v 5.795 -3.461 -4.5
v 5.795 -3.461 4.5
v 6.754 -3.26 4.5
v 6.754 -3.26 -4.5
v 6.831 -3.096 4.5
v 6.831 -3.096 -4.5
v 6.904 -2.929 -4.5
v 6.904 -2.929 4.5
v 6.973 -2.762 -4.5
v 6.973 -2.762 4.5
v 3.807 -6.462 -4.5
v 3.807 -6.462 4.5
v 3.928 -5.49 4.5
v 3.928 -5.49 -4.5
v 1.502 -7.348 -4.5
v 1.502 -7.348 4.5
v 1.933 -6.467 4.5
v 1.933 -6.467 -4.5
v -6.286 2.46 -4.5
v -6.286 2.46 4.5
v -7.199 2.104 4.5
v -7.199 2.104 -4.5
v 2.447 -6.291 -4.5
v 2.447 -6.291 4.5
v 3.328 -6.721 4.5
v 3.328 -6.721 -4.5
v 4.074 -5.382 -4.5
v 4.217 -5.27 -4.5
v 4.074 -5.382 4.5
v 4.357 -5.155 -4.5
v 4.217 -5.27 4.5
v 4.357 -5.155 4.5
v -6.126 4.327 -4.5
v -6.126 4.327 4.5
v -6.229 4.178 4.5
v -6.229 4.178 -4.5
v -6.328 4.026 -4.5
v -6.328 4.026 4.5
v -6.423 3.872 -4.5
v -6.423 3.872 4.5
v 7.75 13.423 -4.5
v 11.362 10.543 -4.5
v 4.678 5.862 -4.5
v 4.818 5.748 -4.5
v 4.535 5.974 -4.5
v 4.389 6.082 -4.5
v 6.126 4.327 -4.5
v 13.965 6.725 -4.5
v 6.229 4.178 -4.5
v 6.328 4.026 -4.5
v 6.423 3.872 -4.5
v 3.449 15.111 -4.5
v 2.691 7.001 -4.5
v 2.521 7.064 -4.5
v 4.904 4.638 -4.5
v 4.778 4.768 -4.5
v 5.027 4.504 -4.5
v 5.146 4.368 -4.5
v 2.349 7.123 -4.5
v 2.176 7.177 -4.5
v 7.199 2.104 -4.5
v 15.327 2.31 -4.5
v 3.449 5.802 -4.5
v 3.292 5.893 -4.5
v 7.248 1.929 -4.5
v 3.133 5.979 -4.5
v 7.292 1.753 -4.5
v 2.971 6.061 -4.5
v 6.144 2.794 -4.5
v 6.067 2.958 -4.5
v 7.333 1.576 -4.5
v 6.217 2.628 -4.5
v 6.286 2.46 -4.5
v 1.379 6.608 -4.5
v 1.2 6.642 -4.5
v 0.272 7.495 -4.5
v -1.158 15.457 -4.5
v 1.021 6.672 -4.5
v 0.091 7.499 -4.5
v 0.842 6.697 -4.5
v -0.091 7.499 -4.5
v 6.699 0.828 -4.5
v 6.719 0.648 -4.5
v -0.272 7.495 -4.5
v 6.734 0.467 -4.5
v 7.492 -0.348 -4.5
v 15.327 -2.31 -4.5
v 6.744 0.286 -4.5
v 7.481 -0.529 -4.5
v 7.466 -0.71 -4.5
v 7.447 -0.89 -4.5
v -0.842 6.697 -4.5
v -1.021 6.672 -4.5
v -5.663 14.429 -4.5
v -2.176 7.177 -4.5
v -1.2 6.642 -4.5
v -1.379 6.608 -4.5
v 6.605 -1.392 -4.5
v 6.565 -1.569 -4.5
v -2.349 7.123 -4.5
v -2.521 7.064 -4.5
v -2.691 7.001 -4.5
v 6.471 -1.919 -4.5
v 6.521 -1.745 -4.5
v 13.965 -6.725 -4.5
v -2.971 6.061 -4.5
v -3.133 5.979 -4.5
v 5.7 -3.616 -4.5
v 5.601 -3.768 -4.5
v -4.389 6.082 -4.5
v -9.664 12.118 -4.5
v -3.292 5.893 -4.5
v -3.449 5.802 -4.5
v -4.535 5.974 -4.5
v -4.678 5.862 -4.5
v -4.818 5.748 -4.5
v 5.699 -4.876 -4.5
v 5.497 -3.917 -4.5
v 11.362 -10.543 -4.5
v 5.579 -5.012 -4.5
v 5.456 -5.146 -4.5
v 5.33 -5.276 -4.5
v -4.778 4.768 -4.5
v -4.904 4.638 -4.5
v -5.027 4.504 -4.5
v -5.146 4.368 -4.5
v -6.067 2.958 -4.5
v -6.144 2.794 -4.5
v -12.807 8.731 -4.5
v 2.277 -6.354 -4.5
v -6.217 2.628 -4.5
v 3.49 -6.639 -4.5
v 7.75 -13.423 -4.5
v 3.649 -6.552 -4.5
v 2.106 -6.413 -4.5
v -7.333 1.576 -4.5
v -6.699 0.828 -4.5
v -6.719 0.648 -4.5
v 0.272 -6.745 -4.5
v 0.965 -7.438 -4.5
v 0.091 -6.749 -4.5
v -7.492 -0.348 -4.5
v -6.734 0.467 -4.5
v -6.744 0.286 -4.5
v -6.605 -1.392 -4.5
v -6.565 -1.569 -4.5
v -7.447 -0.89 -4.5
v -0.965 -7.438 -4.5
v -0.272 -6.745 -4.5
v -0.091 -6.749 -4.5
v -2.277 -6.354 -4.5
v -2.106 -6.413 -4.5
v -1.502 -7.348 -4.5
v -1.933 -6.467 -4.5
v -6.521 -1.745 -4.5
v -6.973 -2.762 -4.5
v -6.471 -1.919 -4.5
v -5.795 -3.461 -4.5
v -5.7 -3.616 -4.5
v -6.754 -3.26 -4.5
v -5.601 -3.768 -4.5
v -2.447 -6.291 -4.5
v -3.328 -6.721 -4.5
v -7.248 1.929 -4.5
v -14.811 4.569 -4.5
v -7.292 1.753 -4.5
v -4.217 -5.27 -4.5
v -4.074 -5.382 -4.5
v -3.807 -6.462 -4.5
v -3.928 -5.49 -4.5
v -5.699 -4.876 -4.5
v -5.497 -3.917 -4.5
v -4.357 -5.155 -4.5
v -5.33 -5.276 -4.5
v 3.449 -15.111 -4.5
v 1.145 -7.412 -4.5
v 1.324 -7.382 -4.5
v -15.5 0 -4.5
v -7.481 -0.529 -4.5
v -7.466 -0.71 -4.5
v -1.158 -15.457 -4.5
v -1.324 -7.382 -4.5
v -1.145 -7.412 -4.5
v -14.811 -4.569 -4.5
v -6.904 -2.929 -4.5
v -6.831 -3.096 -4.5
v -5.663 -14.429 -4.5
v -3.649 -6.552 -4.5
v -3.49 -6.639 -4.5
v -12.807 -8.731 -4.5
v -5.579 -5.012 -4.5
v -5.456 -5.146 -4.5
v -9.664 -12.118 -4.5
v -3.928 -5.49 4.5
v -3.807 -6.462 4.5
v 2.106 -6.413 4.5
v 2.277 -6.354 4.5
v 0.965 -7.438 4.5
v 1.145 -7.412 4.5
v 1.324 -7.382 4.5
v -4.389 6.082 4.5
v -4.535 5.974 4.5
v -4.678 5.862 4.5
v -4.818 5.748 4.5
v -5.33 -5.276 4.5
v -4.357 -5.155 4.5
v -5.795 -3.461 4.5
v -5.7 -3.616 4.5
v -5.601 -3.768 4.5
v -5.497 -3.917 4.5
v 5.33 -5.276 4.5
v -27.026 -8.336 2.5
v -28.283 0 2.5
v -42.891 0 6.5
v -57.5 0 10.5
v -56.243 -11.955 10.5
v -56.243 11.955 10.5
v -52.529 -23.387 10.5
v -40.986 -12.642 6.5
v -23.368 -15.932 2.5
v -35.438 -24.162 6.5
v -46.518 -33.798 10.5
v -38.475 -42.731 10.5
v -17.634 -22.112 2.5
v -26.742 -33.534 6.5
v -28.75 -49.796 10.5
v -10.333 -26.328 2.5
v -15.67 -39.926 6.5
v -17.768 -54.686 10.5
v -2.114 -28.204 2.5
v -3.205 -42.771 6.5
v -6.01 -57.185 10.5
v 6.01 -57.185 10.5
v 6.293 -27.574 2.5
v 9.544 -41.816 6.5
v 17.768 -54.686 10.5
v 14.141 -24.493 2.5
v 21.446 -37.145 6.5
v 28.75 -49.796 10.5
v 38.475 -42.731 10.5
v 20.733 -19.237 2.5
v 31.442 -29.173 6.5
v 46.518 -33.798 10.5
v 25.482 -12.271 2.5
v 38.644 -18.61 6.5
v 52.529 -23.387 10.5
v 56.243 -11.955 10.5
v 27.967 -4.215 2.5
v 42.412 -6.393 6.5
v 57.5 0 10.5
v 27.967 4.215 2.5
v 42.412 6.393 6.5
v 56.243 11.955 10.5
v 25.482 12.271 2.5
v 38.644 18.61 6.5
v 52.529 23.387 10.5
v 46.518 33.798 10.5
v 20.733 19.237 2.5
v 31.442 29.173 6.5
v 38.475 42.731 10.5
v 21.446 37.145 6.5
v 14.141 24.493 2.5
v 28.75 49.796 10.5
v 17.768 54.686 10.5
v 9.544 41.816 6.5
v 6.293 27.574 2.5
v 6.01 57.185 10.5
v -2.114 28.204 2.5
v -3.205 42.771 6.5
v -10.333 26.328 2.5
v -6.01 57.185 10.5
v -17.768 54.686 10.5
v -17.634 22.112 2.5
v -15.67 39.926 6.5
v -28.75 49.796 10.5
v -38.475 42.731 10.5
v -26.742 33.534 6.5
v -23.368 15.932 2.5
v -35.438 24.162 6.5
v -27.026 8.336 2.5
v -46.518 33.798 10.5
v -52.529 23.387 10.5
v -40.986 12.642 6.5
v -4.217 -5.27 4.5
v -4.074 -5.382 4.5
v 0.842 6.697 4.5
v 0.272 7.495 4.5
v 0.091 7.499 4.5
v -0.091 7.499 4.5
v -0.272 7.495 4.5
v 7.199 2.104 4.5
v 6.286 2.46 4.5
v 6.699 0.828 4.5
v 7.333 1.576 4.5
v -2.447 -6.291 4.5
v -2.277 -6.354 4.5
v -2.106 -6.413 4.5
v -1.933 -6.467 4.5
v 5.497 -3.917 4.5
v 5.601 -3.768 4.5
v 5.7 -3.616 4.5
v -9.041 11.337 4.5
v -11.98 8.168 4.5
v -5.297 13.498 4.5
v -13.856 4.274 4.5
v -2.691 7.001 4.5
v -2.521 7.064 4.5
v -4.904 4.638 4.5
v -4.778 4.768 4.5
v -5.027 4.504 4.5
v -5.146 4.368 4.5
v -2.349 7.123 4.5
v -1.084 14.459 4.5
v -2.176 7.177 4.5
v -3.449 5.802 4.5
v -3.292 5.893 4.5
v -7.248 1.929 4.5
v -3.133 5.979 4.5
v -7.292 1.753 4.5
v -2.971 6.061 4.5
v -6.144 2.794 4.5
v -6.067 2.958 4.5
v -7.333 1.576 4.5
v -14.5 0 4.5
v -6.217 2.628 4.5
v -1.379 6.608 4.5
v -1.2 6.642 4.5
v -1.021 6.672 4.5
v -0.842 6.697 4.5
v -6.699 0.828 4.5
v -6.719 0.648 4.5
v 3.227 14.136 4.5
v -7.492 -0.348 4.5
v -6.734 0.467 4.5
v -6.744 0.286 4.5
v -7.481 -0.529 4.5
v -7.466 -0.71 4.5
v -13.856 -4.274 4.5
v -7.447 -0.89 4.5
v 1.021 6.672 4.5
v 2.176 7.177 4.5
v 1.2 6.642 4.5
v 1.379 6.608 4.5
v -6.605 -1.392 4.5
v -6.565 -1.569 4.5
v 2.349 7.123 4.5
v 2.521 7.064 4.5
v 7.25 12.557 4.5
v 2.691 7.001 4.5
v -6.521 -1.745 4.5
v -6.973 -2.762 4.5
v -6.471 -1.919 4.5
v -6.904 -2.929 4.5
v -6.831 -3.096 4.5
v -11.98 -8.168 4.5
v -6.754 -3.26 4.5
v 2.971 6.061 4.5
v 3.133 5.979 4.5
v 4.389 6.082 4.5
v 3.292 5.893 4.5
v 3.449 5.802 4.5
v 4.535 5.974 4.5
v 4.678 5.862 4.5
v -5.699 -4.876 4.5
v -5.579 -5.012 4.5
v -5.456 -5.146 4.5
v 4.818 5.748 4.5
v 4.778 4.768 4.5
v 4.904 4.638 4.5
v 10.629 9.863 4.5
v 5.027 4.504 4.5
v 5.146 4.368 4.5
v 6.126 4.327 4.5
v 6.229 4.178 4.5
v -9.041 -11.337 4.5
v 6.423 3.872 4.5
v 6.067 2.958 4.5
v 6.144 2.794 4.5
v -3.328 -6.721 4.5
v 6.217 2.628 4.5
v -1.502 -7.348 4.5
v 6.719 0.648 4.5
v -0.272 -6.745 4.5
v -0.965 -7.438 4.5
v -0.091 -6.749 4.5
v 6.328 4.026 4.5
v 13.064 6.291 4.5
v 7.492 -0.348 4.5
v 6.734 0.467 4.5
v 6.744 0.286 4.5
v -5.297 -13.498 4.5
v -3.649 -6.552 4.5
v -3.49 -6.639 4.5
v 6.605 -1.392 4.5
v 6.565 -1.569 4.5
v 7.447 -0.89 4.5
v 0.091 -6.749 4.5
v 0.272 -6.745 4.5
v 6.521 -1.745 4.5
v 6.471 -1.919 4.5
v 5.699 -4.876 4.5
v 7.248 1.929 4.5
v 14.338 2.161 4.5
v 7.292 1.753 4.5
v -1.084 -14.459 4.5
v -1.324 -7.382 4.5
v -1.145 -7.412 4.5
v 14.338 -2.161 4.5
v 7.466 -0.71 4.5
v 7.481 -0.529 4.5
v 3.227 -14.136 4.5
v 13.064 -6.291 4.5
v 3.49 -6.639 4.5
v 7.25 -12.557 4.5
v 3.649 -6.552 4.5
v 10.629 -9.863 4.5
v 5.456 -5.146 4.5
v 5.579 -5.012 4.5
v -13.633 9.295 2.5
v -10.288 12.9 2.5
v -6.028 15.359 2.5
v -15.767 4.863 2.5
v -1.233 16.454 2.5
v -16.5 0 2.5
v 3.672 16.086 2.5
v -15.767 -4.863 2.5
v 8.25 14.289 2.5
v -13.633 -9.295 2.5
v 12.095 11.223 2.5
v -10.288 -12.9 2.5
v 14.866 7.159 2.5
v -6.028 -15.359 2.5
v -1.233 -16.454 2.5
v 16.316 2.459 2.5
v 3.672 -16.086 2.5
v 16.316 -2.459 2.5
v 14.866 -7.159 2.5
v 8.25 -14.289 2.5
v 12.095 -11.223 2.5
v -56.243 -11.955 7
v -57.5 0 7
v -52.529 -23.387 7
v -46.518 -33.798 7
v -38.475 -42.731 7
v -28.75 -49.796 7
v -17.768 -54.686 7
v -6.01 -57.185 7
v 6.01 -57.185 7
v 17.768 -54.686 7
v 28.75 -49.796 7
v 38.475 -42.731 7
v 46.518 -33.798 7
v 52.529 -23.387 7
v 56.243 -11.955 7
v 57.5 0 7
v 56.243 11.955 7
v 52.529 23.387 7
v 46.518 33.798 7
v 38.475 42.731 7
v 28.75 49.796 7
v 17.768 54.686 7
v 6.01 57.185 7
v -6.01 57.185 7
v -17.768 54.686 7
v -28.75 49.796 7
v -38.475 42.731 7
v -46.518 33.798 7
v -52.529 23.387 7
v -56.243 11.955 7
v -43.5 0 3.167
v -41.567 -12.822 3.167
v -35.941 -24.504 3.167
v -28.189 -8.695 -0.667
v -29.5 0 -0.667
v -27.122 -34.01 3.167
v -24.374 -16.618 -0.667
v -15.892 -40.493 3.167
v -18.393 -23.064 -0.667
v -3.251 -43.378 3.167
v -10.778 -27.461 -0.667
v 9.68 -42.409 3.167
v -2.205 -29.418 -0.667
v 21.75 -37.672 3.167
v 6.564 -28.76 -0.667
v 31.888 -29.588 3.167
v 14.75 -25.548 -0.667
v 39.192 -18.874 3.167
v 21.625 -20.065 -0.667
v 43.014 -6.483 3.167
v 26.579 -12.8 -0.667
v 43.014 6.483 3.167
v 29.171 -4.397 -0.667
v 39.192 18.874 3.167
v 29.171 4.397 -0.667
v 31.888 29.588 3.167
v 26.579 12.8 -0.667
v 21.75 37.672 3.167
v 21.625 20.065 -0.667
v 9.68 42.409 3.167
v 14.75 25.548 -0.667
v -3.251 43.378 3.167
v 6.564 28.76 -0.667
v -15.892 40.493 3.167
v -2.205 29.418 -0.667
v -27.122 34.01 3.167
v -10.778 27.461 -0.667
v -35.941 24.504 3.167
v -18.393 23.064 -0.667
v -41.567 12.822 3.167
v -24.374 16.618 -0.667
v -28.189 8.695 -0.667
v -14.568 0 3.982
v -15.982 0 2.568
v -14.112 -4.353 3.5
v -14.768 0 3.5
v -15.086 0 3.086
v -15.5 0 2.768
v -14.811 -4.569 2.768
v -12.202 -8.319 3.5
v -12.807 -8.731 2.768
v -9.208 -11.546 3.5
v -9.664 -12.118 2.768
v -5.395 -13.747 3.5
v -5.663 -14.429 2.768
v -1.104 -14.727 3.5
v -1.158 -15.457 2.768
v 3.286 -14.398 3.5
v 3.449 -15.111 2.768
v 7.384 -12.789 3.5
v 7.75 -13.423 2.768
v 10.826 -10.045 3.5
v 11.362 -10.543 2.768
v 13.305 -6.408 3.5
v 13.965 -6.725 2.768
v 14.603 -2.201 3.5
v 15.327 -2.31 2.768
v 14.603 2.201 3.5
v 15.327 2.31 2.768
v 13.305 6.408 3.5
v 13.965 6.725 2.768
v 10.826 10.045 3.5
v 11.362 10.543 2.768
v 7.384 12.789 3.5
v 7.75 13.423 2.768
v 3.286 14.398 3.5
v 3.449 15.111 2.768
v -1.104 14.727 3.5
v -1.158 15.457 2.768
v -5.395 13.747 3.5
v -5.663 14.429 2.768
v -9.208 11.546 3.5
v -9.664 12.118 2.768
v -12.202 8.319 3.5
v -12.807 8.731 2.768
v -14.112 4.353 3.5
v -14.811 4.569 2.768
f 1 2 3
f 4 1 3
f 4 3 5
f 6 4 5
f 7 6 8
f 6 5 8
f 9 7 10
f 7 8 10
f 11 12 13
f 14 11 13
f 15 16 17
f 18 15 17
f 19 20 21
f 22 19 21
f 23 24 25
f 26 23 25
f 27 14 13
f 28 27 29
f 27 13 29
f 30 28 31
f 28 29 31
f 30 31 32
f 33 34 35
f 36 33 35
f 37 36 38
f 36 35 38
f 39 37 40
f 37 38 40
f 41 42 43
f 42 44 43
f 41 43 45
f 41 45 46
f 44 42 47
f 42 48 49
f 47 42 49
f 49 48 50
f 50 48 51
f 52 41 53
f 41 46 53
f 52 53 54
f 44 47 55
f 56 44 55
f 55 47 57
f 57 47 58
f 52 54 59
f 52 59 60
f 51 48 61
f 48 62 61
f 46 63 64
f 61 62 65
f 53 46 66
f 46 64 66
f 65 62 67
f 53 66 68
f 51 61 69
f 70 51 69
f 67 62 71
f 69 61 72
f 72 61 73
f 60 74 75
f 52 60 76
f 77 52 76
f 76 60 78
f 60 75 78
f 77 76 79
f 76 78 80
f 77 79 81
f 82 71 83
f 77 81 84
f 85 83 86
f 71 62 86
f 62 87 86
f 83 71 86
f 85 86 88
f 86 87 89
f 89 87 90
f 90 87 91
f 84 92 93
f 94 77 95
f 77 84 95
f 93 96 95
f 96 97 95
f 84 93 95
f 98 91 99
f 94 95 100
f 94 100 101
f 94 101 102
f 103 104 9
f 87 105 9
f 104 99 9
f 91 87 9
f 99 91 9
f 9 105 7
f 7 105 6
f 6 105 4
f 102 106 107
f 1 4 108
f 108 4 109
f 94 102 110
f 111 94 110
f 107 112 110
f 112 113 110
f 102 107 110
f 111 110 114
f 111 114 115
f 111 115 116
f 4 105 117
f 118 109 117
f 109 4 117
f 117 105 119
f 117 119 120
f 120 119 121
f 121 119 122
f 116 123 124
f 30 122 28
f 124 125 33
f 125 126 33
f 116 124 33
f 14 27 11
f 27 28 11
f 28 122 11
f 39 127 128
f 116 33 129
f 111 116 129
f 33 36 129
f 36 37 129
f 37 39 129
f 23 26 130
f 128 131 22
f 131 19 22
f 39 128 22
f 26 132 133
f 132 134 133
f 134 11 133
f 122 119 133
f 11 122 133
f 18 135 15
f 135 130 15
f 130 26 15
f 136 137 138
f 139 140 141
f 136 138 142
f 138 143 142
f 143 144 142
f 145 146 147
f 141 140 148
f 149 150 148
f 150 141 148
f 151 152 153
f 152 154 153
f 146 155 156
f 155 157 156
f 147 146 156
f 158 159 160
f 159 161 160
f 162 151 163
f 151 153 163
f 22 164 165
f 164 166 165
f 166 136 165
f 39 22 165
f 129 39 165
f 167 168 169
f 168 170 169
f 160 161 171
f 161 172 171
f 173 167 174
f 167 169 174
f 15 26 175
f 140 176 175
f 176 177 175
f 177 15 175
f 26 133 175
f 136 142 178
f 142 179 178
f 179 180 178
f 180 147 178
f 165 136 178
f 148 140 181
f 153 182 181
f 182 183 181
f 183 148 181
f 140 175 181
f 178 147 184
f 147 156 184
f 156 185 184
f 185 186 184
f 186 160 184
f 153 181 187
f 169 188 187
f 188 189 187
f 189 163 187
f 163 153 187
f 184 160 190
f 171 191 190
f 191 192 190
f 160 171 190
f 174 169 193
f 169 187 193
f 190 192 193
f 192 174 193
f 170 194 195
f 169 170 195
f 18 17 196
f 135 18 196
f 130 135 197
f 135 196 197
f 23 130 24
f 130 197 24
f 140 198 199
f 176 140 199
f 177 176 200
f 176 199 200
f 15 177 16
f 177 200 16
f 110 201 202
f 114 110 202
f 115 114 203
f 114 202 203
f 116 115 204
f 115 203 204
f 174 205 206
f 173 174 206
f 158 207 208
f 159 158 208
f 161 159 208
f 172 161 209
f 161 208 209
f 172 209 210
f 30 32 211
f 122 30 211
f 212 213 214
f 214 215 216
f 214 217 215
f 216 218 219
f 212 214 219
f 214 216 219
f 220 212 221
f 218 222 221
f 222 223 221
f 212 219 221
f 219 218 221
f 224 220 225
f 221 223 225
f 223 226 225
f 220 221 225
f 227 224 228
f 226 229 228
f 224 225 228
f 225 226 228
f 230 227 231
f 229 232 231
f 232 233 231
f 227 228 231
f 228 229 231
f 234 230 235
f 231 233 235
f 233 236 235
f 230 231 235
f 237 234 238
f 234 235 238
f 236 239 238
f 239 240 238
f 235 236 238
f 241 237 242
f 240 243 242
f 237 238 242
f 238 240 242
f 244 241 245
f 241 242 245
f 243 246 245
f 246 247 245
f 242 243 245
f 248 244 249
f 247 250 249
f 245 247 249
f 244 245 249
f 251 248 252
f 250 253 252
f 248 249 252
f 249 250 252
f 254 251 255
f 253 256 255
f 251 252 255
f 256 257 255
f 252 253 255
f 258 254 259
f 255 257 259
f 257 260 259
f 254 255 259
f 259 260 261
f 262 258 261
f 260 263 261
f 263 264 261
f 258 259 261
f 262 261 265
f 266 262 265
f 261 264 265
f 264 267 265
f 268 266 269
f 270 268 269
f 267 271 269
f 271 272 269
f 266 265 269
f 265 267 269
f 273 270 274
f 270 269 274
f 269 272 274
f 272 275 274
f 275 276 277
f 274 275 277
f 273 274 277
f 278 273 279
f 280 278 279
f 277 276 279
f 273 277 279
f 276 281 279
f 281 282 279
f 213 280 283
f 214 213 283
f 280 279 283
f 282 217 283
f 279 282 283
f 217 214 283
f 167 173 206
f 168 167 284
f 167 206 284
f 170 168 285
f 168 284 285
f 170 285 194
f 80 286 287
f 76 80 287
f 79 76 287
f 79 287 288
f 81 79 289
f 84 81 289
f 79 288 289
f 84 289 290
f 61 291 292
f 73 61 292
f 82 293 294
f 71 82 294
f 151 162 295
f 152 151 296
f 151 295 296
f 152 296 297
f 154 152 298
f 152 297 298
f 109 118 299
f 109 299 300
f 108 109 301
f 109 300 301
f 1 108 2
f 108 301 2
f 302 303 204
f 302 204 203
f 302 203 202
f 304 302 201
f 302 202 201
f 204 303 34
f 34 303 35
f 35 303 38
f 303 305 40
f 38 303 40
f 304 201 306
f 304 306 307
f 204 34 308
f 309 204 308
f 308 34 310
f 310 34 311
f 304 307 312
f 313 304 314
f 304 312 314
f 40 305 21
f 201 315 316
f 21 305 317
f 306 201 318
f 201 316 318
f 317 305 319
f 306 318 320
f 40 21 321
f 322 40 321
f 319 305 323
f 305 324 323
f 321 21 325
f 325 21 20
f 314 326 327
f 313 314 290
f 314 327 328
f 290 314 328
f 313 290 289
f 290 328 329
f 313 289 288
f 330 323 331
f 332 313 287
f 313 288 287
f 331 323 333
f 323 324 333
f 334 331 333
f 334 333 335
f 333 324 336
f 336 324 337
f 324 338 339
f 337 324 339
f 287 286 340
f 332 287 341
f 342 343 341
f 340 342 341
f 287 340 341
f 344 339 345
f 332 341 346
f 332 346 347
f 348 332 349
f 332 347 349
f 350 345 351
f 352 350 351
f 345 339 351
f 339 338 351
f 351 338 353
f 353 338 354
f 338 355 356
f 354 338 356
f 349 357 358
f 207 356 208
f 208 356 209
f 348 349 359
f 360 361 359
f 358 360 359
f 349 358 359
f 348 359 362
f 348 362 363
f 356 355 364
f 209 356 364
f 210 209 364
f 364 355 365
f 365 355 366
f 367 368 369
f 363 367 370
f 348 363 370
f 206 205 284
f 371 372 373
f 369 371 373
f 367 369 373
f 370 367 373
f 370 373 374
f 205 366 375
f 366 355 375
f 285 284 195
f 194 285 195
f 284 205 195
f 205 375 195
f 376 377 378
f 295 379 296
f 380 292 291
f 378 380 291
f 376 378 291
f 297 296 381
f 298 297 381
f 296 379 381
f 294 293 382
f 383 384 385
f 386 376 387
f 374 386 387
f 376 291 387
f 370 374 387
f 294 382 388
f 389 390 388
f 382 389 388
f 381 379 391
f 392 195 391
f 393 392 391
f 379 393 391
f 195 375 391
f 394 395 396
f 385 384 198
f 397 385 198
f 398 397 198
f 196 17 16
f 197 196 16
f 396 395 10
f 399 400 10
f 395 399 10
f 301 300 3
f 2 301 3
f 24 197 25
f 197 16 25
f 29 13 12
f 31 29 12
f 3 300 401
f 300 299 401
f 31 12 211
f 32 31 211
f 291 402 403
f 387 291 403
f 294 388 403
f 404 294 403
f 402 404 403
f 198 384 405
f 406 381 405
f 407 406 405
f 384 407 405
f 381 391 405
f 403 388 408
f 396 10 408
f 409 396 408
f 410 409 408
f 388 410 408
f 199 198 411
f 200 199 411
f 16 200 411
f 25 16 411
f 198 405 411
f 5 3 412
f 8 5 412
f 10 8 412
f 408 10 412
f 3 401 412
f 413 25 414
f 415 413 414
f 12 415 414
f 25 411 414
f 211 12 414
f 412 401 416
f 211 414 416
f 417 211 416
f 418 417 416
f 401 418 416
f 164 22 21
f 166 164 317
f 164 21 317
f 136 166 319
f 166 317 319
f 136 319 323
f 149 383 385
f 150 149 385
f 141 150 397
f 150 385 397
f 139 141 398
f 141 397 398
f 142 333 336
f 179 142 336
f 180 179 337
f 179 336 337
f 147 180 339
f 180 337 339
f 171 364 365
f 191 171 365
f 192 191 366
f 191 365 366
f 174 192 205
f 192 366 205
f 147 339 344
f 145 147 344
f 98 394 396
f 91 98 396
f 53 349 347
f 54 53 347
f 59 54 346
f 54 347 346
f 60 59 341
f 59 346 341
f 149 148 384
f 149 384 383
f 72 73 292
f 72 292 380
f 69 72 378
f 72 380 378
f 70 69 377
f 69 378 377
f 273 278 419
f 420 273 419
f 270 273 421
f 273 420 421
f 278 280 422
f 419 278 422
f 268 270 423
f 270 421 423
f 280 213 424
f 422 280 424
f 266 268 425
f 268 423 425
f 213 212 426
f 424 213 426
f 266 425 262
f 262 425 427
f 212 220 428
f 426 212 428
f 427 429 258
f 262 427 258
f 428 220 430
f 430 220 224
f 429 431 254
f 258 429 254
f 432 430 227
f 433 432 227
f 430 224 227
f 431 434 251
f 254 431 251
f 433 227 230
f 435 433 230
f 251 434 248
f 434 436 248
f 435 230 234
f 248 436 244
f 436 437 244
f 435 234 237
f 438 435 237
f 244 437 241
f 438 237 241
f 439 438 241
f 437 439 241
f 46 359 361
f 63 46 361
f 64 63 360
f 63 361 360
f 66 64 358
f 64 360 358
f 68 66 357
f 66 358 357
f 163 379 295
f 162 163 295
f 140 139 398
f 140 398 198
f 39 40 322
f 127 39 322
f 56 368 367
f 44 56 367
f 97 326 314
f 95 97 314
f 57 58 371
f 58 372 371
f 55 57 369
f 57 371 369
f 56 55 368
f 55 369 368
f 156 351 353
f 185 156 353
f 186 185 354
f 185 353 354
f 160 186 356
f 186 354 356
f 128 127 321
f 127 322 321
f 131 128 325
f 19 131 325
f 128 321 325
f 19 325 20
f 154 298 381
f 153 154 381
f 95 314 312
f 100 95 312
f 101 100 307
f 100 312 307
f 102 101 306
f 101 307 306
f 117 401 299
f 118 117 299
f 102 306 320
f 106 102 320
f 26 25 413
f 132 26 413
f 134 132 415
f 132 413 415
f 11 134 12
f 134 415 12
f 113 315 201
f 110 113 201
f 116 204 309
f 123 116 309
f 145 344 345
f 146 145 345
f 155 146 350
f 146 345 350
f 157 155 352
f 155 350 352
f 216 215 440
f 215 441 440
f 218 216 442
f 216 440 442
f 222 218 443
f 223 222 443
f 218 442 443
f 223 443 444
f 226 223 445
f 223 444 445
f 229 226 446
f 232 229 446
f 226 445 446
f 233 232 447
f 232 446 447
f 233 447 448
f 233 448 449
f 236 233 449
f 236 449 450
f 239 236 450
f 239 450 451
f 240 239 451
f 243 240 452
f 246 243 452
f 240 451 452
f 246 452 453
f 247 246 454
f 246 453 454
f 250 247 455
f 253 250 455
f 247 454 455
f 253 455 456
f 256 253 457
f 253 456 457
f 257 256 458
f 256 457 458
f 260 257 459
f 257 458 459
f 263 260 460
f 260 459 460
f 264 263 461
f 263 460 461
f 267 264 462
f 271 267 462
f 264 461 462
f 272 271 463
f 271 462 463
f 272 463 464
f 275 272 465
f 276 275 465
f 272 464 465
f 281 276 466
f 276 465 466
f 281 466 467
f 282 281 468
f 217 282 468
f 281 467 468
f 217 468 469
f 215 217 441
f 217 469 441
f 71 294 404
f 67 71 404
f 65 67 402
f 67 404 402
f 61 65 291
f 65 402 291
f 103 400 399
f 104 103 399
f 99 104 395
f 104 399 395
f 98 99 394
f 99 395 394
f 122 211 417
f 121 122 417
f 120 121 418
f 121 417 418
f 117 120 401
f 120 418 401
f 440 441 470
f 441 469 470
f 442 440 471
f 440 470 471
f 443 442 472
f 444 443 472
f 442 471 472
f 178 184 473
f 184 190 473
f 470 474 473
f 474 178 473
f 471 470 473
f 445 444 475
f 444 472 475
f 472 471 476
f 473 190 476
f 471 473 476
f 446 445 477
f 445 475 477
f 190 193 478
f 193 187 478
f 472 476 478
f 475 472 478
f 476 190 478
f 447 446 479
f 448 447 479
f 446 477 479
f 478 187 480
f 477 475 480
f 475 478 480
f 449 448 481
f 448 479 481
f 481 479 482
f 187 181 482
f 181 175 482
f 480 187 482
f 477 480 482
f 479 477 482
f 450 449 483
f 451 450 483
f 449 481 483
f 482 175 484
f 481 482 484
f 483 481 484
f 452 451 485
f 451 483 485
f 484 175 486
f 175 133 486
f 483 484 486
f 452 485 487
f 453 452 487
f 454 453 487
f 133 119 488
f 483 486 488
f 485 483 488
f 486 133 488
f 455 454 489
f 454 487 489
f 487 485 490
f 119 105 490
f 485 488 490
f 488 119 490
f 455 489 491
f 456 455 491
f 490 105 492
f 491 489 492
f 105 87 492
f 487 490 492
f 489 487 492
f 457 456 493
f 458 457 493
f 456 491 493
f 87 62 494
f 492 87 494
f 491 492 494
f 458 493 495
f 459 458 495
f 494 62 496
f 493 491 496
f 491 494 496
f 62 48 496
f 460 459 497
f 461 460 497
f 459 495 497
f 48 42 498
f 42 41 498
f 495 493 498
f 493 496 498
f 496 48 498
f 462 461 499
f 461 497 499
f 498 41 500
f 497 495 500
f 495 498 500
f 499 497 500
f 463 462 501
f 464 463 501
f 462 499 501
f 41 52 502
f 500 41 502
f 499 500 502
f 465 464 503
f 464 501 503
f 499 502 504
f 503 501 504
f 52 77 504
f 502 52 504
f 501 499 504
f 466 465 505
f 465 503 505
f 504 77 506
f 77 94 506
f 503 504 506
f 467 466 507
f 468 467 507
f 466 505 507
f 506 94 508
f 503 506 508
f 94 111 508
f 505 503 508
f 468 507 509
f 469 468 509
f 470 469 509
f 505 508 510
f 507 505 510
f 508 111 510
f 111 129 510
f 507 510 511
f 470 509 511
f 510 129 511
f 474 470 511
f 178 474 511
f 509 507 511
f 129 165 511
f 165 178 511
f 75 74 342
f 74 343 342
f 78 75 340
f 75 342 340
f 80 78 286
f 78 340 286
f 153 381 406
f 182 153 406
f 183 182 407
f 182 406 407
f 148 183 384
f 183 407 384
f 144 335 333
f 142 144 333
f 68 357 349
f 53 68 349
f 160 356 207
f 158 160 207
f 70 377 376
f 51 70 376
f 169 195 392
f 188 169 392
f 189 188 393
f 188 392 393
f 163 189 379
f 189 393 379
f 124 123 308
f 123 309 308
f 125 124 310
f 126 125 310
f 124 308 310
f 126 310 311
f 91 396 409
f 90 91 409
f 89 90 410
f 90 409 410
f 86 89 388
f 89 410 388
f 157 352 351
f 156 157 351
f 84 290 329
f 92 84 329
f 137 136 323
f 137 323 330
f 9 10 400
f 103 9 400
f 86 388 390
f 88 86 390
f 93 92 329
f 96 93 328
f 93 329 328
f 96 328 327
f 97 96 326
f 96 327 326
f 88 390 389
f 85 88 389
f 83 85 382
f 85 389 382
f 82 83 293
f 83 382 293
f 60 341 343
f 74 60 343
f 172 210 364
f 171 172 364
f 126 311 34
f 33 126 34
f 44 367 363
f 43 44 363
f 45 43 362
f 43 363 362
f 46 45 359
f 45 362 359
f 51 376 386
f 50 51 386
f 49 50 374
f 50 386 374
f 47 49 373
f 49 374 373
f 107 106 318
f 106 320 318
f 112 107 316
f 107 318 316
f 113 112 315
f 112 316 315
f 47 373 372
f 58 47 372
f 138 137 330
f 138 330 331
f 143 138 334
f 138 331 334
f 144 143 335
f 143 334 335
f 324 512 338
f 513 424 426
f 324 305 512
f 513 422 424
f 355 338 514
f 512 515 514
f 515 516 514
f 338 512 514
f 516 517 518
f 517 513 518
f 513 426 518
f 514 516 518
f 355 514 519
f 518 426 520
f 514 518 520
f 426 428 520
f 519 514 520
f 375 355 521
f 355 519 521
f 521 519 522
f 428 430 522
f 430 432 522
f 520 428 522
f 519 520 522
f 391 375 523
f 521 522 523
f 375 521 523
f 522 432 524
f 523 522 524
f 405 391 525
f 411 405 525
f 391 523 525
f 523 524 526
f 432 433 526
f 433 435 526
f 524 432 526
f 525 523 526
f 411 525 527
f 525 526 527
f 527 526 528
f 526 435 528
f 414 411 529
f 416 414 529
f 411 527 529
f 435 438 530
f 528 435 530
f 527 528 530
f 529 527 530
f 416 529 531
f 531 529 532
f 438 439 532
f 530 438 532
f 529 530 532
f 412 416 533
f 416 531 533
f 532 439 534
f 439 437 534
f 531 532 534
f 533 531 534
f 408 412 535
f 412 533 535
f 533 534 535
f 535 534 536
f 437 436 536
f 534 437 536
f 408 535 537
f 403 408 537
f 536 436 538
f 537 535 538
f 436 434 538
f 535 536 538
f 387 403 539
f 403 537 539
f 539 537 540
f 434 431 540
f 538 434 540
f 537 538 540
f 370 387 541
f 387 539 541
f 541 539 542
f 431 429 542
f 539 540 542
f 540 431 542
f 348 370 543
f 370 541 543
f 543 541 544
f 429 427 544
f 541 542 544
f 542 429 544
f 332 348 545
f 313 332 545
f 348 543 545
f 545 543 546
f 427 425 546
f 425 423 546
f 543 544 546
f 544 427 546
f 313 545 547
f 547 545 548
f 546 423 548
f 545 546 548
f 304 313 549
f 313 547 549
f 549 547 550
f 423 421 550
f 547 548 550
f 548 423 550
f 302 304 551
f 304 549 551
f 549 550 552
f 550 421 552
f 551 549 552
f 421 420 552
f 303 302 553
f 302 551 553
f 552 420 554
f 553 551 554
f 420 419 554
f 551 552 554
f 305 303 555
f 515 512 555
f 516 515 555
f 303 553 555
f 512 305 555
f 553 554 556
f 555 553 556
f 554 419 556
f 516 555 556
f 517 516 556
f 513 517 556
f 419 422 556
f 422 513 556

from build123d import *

# Parameters (mm, degrees)
CUT_EXTRUDE2_DEPTH = 82.813813015


with BuildPart() as part:
    # Sketch1 → Revolve1 (revolve)
    with BuildSketch(Plane(origin=(0, 0, 0), x_dir=(0, 0, -1), z_dir=(1, 0, 0)), mode=Mode.PRIVATE) as revolve1_sk:
        with BuildLine():
            Line((4.5, 6.75), (-4.5, 6.75))
            Line((-4.5, 6.75), (-4.5, 14.5))
            ThreePointArc((-4.5, 14.5), (-3.085786438, 15.085786438), (-2.5, 16.5))
            Line((-2.5, 16.5), (-2.5, 28.282608696))
            Line((-2.5, 28.282608696), (-10.5, 57.5))
            Line((-10.5, 57.5), (-7, 57.5))
            Line((-7, 57.5), (4.5, 15.5))
            Line((4.5, 15.5), (4.5, 6.75))
        make_face()
    revolve(revolve1_sk.sketch.rotate(Axis((0, 0, 0), (0, 0, 1)), 90), axis=Axis((0, 0, 0), (0, 0, 1)))

    # Sketch5 → Cut-Extrude2 (cut, through all)
    with BuildSketch(Plane.XY.offset(4.5)):
        with BuildLine():
            Line((-0.272121044, 7.495061717), (-0.84170062, 6.697315885))
            ThreePointArc((-0.84170062, 6.697315885), (0, 6.75), (0.84170062, 6.697315885))
            Line((0.84170062, 6.697315885), (0.272121044, 7.495061717))
            ThreePointArc((0.272121044, 7.495061717), (0, 7.5), (-0.272121044, 7.495061717))
        make_face()
        with BuildLine():
            Line((2.176265786, 7.177316158), (1.378519955, 6.607736582))
            ThreePointArc((1.378519955, 6.607736582), (2.191721417, 6.384266381), (2.970709872, 6.061137093))
            Line((2.970709872, 6.061137093), (2.691019336, 7.000601041))
            ThreePointArc((2.691019336, 7.000601041), (2.435246019, 7.093629313), (2.176265786, 7.177316158))
        make_face()
        with BuildLine():
            Line((4.38882045, 6.081797026), (3.449356502, 5.80210649))
            ThreePointArc((3.449356502, 5.80210649), (4.145935811, 5.326698438), (4.777796613, 4.768140048))
            Line((4.777796613, 4.768140048), (4.818303928, 5.747516617))
            ThreePointArc((4.818303928, 5.747516617), (4.606595345, 5.91855382), (4.38882045, 6.081797026))
        make_face()
        with BuildLine():
            Line((6.125778318, 4.327220817), (5.14640175, 4.367728131))
            ThreePointArc((5.14640175, 4.367728131), (5.650873728, 3.691900067), (6.067134957, 2.958441044))
            Line((6.067134957, 2.958441044), (6.423450525, 3.871599585))
            ThreePointArc((6.423450525, 3.871599585), (6.278748587, 4.102111186), (6.125778318, 4.327220817))
        make_face()
        with BuildLine():
            Line((7.198913054, 2.103723089), (6.285754514, 2.460038657))
            ThreePointArc((6.285754514, 2.460038657), (6.543451795, 1.657027038), (6.699005087, 0.828149048))
            Line((6.699005087, 0.828149048), (7.332516588, 1.576134664))
            ThreePointArc((7.332516588, 1.576134664), (7.270501995, 1.841141154), (7.198913054, 2.103723089))
        make_face()
        with BuildLine():
            Line((7.491933859, -0.347745678), (6.743948242, 0.285765823))
            ThreePointArc((6.743948242, 0.285765823), (6.726945328, -0.557410582), (6.60493407, -1.391885748))
            Line((6.60493407, -1.391885748), (7.446990703, -0.890128903))
            ThreePointArc((7.446990703, -0.890128903), (7.474383698, -0.619345091), (7.491933859, -0.347745678))
        make_face()
        with BuildLine():
            Line((6.97308738, -2.761530806), (6.471330536, -1.919474172))
            ThreePointArc((6.471330536, -1.919474172), (6.181469955, -2.711444116), (5.79511596, -3.461088125))
            Line((5.79511596, -3.461088125), (6.754467824, -3.259933193))
            ThreePointArc((6.754467824, -3.259933193), (6.86829995, -3.012715685), (6.97308738, -2.761530806))
        make_face()
        with BuildLine():
            Line((5.698598685, -4.87606122), (5.497443753, -3.916709357))
            ThreePointArc((5.497443753, -3.916709357), (4.966136397, -4.571650608), (4.357307116, -5.1552279))
            Line((4.357307116, -5.1552279), (5.329993549, -5.276473137))
            ThreePointArc((5.329993549, -5.276473137), (5.51792933, -5.079611787), (5.698598685, -4.87606122))
        make_face()
        with BuildLine():
            Line((3.8065784, -6.462194742), (3.927823637, -5.489508309))
            ThreePointArc((3.927823637, -5.489508309), (3.212644903, -5.936447821), (2.447316435, -6.29071874))
            Line((2.447316435, -6.29071874), (3.32793177, -6.721225345))
            ThreePointArc((3.32793177, -6.721225345), (3.569605448, -6.596053134), (3.8065784, -6.462194742))
        make_face()
        with BuildLine():
            Line((1.50205628, -7.348049192), (1.932562884, -6.467433857))
            ThreePointArc((1.932562884, -6.467433857), (1.111013484, -6.657938798), (0.272121044, -6.744512595))
            Line((0.272121044, -6.744512595), (0.965236945, -7.437628496))
            ThreePointArc((0.965236945, -7.437628496), (1.234459427, -7.397709776), (1.50205628, -7.348049192))
        make_face()
        with BuildLine():
            Line((-0.965236945, -7.437628496), (-0.272121044, -6.744512595))
            ThreePointArc((-0.272121044, -6.744512595), (-1.111013484, -6.657938798), (-1.932562884, -6.467433857))
            Line((-1.932562884, -6.467433857), (-1.50205628, -7.348049192))
            ThreePointArc((-1.50205628, -7.348049192), (-1.234459427, -7.397709776), (-0.965236945, -7.437628496))
        make_face()
        with BuildLine():
            Line((-3.32793177, -6.721225345), (-2.447316435, -6.29071874))
            ThreePointArc((-2.447316435, -6.29071874), (-3.212644903, -5.936447821), (-3.927823637, -5.489508309))
            Line((-3.927823637, -5.489508309), (-3.8065784, -6.462194742))
            ThreePointArc((-3.8065784, -6.462194742), (-3.569605448, -6.596053134), (-3.32793177, -6.721225345))
        make_face()
        with BuildLine():
            Line((-5.329993549, -5.276473137), (-4.357307116, -5.1552279))
            ThreePointArc((-4.357307116, -5.1552279), (-4.966136397, -4.571650608), (-5.497443753, -3.916709357))
            Line((-5.497443753, -3.916709357), (-5.698598685, -4.87606122))
            ThreePointArc((-5.698598685, -4.87606122), (-5.51792933, -5.079611787), (-5.329993549, -5.276473137))
        make_face()
        with BuildLine():
            Line((-6.754467824, -3.259933193), (-5.79511596, -3.461088125))
            ThreePointArc((-5.79511596, -3.461088125), (-6.181469955, -2.711444116), (-6.471330536, -1.919474172))
            Line((-6.471330536, -1.919474172), (-6.97308738, -2.761530806))
            ThreePointArc((-6.97308738, -2.761530806), (-6.86829995, -3.012715685), (-6.754467824, -3.259933193))
        make_face()
        with BuildLine():
            Line((-7.446990703, -0.890128903), (-6.60493407, -1.391885748))
            ThreePointArc((-6.60493407, -1.391885748), (-6.726945328, -0.557410582), (-6.743948242, 0.285765823))
            Line((-6.743948242, 0.285765823), (-7.491933859, -0.347745678))
            ThreePointArc((-7.491933859, -0.347745678), (-7.474383698, -0.619345091), (-7.446990703, -0.890128903))
        make_face()
        with BuildLine():
            Line((-7.332516588, 1.576134664), (-6.699005087, 0.828149048))
            ThreePointArc((-6.699005087, 0.828149048), (-6.543451795, 1.657027038), (-6.285754514, 2.460038657))
            Line((-6.285754514, 2.460038657), (-7.198913054, 2.103723089))
            ThreePointArc((-7.198913054, 2.103723089), (-7.270501995, 1.841141154), (-7.332516588, 1.576134664))
        make_face()
        with BuildLine():
            Line((-6.423450525, 3.871599585), (-6.067134957, 2.958441044))
            ThreePointArc((-6.067134957, 2.958441044), (-5.650873728, 3.691900067), (-5.14640175, 4.367728131))
            Line((-5.14640175, 4.367728131), (-6.125778318, 4.327220817))
            ThreePointArc((-6.125778318, 4.327220817), (-6.278748587, 4.102111186), (-6.423450525, 3.871599585))
        make_face()
        with BuildLine():
            Line((-4.818303928, 5.747516617), (-4.777796613, 4.768140048))
            ThreePointArc((-4.777796613, 4.768140048), (-4.145935811, 5.326698438), (-3.449356502, 5.80210649))
            Line((-3.449356502, 5.80210649), (-4.38882045, 6.081797026))
            ThreePointArc((-4.38882045, 6.081797026), (-4.606595345, 5.91855382), (-4.818303928, 5.747516617))
        make_face()
        with BuildLine():
            Line((-2.691019336, 7.000601041), (-2.970709872, 6.061137093))
            ThreePointArc((-2.970709872, 6.061137093), (-2.191721417, 6.384266381), (-1.378519955, 6.607736582))
            Line((-1.378519955, 6.607736582), (-2.176265786, 7.177316158))
            ThreePointArc((-2.176265786, 7.177316158), (-2.435246019, 7.093629313), (-2.691019336, 7.000601041))
        make_face()
    extrude(amount=-CUT_EXTRUDE2_DEPTH, mode=Mode.SUBTRACT)


solid = part.part
